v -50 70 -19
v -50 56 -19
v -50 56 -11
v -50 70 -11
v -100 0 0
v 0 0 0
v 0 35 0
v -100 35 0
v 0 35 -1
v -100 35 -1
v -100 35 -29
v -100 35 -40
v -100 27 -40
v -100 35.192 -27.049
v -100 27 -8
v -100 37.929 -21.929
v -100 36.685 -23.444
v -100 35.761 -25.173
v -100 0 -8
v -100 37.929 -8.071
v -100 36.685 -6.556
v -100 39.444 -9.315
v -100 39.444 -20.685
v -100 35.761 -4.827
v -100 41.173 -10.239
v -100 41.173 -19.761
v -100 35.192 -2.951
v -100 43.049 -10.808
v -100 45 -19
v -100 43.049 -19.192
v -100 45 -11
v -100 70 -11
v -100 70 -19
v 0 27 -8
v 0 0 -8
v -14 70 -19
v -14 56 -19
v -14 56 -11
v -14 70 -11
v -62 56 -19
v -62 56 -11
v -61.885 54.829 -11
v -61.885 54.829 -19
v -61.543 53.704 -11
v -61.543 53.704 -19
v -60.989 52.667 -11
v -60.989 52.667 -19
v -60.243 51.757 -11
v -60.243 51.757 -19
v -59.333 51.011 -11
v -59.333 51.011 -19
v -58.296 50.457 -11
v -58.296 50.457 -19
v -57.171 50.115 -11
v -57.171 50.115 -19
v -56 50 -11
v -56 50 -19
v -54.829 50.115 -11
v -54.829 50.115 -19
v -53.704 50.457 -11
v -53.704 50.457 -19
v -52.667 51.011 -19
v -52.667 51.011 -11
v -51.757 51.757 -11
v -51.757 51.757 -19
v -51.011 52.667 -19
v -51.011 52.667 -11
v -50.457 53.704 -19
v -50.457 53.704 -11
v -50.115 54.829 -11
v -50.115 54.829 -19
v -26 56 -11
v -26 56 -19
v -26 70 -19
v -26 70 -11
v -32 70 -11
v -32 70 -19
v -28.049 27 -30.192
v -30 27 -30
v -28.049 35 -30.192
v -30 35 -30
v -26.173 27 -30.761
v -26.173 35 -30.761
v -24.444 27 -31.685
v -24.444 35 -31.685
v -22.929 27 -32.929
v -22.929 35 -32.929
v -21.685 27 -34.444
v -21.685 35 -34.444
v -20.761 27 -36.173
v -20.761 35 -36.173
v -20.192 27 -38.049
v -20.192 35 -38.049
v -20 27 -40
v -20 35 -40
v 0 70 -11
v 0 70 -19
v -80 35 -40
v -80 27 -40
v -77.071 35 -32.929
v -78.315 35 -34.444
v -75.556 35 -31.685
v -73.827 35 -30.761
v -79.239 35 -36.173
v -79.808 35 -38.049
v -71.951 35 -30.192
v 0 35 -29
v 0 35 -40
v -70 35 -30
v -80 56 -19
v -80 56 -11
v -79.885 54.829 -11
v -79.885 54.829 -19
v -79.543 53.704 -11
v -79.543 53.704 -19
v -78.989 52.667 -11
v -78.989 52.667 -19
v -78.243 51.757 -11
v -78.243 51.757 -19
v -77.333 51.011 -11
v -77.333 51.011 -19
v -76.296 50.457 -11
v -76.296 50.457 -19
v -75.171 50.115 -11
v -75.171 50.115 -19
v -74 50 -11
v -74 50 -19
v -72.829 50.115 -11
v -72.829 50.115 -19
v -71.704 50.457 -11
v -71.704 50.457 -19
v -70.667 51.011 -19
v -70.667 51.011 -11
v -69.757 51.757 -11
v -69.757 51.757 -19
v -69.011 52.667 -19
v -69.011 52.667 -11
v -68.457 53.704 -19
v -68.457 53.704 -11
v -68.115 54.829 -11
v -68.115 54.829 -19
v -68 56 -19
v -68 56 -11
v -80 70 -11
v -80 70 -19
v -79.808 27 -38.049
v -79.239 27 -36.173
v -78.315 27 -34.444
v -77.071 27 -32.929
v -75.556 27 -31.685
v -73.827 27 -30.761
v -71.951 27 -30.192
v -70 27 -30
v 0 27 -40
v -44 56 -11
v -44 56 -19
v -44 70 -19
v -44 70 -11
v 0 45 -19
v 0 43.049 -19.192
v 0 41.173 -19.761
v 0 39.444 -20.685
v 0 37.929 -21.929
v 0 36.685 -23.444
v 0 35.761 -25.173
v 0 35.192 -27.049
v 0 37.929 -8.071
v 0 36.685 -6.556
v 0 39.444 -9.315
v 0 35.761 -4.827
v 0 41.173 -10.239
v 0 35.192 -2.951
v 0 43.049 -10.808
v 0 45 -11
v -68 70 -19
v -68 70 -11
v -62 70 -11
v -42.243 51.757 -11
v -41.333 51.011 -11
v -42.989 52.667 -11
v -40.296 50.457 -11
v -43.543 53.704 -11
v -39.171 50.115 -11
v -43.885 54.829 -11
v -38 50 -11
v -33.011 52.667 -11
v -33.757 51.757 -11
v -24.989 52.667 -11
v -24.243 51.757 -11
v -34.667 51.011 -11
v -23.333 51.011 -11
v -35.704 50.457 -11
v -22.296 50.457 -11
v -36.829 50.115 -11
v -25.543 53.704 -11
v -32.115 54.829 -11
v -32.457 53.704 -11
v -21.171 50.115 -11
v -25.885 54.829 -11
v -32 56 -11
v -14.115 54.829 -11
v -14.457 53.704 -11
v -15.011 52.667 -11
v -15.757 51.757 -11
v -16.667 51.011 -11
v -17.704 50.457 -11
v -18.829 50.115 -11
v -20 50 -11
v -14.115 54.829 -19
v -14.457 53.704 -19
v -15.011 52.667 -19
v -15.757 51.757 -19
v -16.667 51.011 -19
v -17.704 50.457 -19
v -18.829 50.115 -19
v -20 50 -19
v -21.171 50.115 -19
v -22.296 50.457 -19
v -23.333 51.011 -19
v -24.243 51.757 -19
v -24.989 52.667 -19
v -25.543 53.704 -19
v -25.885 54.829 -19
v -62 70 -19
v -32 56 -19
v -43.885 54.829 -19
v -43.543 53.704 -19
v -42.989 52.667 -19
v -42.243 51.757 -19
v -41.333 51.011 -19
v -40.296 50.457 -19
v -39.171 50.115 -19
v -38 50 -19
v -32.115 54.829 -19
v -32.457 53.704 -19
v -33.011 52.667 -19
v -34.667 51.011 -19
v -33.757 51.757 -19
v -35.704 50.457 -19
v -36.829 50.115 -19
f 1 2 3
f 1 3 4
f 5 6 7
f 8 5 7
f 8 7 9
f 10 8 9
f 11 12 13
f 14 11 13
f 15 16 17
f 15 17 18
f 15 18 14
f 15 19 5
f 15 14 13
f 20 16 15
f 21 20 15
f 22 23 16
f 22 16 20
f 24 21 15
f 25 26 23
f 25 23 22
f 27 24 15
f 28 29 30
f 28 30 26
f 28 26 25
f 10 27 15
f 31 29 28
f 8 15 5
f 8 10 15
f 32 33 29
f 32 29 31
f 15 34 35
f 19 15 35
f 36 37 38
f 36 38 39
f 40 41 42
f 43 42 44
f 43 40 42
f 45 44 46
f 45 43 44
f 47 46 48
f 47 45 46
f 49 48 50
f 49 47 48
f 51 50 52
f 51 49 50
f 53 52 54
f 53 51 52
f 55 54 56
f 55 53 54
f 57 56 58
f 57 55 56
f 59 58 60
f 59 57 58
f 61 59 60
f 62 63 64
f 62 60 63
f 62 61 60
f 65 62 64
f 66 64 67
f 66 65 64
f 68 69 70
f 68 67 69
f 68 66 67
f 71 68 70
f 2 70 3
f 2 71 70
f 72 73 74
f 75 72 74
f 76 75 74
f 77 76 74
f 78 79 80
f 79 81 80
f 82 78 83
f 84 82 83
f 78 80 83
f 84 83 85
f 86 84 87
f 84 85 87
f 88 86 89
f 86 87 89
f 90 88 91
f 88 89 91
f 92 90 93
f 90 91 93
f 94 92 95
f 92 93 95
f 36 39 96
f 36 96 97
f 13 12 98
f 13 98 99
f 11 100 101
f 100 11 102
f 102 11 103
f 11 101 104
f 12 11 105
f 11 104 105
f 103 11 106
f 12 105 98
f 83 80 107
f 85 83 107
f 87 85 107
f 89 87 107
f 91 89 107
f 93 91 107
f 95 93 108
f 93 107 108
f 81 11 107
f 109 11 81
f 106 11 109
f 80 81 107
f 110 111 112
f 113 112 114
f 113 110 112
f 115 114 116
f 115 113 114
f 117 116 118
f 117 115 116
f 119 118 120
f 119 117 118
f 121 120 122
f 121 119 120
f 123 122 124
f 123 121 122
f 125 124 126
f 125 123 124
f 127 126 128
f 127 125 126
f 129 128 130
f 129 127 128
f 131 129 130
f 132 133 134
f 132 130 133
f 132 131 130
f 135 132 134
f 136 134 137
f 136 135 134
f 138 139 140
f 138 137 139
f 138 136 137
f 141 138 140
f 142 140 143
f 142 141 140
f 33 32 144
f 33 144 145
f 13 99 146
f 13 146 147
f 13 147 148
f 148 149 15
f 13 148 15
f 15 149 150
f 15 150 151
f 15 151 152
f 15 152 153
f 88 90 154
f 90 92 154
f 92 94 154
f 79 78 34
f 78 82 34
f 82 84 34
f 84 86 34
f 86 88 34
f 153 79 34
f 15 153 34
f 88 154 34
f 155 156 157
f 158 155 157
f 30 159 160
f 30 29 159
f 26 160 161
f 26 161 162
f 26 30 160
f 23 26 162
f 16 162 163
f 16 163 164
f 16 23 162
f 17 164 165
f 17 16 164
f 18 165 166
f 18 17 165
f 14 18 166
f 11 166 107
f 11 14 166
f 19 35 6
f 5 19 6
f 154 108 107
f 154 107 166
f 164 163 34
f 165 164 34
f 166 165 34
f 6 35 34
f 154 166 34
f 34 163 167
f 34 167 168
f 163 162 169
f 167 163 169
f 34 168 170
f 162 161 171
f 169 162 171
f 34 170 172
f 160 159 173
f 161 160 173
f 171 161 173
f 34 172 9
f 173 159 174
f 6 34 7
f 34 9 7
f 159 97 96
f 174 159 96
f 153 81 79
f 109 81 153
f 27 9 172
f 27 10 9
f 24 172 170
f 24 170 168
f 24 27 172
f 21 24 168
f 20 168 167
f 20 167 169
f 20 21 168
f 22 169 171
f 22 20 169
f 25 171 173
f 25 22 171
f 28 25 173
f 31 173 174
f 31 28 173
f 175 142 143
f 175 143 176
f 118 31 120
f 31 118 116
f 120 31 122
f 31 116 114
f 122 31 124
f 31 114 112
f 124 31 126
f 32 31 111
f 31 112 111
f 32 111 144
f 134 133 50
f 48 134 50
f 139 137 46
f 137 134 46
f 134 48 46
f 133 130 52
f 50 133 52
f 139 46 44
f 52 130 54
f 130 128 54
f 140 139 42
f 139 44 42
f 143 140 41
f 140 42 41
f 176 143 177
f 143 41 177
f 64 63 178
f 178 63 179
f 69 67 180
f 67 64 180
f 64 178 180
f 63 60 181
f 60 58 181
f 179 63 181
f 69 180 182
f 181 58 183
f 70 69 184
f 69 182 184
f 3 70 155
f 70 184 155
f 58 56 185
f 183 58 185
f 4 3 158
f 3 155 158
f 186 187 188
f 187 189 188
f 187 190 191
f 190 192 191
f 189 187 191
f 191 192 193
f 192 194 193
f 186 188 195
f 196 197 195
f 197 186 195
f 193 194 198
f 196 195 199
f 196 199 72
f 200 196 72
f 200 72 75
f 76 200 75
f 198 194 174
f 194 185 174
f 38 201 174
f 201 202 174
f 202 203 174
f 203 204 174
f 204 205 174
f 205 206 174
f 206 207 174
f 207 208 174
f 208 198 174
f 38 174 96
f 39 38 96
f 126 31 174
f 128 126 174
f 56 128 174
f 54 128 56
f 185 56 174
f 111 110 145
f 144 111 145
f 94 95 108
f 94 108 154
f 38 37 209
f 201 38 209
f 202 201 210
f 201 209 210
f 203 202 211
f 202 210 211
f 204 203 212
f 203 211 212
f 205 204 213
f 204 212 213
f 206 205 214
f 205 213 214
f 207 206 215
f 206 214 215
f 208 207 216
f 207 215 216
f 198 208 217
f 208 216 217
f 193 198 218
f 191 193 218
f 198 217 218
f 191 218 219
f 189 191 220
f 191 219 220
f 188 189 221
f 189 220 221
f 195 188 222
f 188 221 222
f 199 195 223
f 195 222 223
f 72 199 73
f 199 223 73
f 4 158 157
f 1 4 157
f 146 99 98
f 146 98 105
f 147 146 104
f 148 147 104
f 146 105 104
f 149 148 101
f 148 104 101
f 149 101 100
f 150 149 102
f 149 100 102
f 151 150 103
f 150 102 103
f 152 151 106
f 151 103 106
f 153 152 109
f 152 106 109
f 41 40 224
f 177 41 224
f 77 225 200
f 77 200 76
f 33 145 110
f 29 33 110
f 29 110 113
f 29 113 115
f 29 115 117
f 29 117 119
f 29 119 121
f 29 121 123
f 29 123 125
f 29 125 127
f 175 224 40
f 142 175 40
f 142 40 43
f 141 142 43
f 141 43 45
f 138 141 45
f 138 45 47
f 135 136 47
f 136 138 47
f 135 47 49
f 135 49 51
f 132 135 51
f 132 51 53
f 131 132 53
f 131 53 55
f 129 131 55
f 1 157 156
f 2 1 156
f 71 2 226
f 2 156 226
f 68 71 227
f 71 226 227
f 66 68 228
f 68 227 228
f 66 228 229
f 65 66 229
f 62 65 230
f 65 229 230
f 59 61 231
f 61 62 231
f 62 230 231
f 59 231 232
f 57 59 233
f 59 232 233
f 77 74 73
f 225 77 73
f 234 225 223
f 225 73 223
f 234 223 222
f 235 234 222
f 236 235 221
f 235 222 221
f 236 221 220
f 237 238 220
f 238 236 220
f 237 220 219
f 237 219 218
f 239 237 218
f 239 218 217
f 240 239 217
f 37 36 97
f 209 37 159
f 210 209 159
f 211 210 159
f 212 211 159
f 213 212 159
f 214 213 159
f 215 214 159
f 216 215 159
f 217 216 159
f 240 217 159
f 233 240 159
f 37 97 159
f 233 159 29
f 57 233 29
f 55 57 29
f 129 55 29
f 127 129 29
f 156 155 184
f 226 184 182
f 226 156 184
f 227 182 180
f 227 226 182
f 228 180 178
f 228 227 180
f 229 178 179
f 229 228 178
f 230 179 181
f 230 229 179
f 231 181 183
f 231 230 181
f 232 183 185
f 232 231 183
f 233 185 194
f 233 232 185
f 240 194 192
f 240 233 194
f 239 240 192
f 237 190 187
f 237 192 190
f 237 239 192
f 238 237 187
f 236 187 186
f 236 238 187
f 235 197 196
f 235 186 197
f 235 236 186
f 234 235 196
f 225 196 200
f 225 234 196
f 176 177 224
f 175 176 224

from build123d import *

# Parameters (mm, degrees)
BOSS_EXTRUDE1_DEPTH = 100
FILLET1_R           = 10
SKETCH4_W           = 60
SKETCH4_H           = 8
CUT_EXTRUDE1_DEPTH  = 10
FILLET2_R           = 10
SKETCH5_W           = 12
SKETCH5_H           = 14
CUT_EXTRUDE2_DEPTH  = 10
CUT_EXTRUDE3_DEPTH  = 10


with BuildPart() as part:
    # Sketch1 → Boss-Extrude1 (new body)
    with BuildSketch(Plane(origin=(0, 0, 0), x_dir=(0, 0, -1), z_dir=(1, 0, 0))):
        Polygon((0, 0), (0, 35), (11, 35), (11, 70), (19, 70), (19, 35), (40, 35), (40, 27), (8, 27), (8, 0), align=None)
    extrude(amount=-BOSS_EXTRUDE1_DEPTH)

    # Fillet1
    fillet1_edges = [part.edges().sort_by_distance(p)[0] for p in [
        (-50, 35, -11),
        (-50, 35, -19),
    ]]
    fillet(fillet1_edges, radius=FILLET1_R)

    # Sketch4 → Cut-Extrude1 (cut)
    with BuildSketch(Plane(origin=(0, 0, -40), x_dir=(-1, 0, 0), z_dir=(0, 0, -1))):
        with Locations((50, 31)):
            Rectangle(SKETCH4_W, SKETCH4_H)
    extrude(amount=-CUT_EXTRUDE1_DEPTH, mode=Mode.SUBTRACT)

    # Fillet2
    fillet2_edges = [part.edges().sort_by_distance(p)[0] for p in [
        (-20, 31, -30),
        (-80, 31, -30),
    ]]
    fillet(fillet2_edges, radius=FILLET2_R - 0.0001)  # a hair under: the kernel refuses the full size

    # Sketch5 → Cut-Extrude2 (cut)
    with BuildSketch(Plane(origin=(0, 0, -19), x_dir=(-1, 0, 0), z_dir=(0, 0, -1))):
        with Locations((20, 63)):
            Rectangle(SKETCH5_W, SKETCH5_H)
        with Locations((38, 63)):
            Rectangle(SKETCH5_W, SKETCH5_H)
        with Locations((74, 63)):
            Rectangle(SKETCH5_W, SKETCH5_H)
        with Locations((56, 63)):
            Rectangle(SKETCH5_W, SKETCH5_H)
    extrude(amount=-CUT_EXTRUDE2_DEPTH, mode=Mode.SUBTRACT)

    # Sketch6 → Cut-Extrude3 (cut)
    with BuildSketch(Plane(origin=(0, 0, -19), x_dir=(-1, 0, 0), z_dir=(0, 0, -1))):
        with BuildLine():
            Line((14, 58.578725951), (14, 56))
            ThreePointArc((14, 56), (20, 50), (26, 56))
            Line((26, 56), (26, 58.578725951))
            Line((26, 58.578725951), (14, 58.578725951))
        make_face()
        with BuildLine():
            Line((32, 56), (32, 58.578725951))
            Line((32, 58.578725951), (44, 58.578725951))
            Line((44, 58.578725951), (44, 56))
            ThreePointArc((44, 56), (38, 50), (32, 56))
        make_face()
        with BuildLine():
            Line((50, 56), (50, 58.578725951))
            Line((50, 58.578725951), (62, 58.578725951))
            Line((62, 58.578725951), (62, 56))
            ThreePointArc((62, 56), (56, 50), (50, 56))
        make_face()
        with BuildLine():
            Line((68, 56), (68, 58.578725951))
            Line((68, 58.578725951), (80, 58.578725951))
            Line((80, 58.578725951), (80, 56))
            ThreePointArc((80, 56), (74, 50), (68, 56))
        make_face()
    extrude(amount=-CUT_EXTRUDE3_DEPTH, mode=Mode.SUBTRACT)


solid = part.part
